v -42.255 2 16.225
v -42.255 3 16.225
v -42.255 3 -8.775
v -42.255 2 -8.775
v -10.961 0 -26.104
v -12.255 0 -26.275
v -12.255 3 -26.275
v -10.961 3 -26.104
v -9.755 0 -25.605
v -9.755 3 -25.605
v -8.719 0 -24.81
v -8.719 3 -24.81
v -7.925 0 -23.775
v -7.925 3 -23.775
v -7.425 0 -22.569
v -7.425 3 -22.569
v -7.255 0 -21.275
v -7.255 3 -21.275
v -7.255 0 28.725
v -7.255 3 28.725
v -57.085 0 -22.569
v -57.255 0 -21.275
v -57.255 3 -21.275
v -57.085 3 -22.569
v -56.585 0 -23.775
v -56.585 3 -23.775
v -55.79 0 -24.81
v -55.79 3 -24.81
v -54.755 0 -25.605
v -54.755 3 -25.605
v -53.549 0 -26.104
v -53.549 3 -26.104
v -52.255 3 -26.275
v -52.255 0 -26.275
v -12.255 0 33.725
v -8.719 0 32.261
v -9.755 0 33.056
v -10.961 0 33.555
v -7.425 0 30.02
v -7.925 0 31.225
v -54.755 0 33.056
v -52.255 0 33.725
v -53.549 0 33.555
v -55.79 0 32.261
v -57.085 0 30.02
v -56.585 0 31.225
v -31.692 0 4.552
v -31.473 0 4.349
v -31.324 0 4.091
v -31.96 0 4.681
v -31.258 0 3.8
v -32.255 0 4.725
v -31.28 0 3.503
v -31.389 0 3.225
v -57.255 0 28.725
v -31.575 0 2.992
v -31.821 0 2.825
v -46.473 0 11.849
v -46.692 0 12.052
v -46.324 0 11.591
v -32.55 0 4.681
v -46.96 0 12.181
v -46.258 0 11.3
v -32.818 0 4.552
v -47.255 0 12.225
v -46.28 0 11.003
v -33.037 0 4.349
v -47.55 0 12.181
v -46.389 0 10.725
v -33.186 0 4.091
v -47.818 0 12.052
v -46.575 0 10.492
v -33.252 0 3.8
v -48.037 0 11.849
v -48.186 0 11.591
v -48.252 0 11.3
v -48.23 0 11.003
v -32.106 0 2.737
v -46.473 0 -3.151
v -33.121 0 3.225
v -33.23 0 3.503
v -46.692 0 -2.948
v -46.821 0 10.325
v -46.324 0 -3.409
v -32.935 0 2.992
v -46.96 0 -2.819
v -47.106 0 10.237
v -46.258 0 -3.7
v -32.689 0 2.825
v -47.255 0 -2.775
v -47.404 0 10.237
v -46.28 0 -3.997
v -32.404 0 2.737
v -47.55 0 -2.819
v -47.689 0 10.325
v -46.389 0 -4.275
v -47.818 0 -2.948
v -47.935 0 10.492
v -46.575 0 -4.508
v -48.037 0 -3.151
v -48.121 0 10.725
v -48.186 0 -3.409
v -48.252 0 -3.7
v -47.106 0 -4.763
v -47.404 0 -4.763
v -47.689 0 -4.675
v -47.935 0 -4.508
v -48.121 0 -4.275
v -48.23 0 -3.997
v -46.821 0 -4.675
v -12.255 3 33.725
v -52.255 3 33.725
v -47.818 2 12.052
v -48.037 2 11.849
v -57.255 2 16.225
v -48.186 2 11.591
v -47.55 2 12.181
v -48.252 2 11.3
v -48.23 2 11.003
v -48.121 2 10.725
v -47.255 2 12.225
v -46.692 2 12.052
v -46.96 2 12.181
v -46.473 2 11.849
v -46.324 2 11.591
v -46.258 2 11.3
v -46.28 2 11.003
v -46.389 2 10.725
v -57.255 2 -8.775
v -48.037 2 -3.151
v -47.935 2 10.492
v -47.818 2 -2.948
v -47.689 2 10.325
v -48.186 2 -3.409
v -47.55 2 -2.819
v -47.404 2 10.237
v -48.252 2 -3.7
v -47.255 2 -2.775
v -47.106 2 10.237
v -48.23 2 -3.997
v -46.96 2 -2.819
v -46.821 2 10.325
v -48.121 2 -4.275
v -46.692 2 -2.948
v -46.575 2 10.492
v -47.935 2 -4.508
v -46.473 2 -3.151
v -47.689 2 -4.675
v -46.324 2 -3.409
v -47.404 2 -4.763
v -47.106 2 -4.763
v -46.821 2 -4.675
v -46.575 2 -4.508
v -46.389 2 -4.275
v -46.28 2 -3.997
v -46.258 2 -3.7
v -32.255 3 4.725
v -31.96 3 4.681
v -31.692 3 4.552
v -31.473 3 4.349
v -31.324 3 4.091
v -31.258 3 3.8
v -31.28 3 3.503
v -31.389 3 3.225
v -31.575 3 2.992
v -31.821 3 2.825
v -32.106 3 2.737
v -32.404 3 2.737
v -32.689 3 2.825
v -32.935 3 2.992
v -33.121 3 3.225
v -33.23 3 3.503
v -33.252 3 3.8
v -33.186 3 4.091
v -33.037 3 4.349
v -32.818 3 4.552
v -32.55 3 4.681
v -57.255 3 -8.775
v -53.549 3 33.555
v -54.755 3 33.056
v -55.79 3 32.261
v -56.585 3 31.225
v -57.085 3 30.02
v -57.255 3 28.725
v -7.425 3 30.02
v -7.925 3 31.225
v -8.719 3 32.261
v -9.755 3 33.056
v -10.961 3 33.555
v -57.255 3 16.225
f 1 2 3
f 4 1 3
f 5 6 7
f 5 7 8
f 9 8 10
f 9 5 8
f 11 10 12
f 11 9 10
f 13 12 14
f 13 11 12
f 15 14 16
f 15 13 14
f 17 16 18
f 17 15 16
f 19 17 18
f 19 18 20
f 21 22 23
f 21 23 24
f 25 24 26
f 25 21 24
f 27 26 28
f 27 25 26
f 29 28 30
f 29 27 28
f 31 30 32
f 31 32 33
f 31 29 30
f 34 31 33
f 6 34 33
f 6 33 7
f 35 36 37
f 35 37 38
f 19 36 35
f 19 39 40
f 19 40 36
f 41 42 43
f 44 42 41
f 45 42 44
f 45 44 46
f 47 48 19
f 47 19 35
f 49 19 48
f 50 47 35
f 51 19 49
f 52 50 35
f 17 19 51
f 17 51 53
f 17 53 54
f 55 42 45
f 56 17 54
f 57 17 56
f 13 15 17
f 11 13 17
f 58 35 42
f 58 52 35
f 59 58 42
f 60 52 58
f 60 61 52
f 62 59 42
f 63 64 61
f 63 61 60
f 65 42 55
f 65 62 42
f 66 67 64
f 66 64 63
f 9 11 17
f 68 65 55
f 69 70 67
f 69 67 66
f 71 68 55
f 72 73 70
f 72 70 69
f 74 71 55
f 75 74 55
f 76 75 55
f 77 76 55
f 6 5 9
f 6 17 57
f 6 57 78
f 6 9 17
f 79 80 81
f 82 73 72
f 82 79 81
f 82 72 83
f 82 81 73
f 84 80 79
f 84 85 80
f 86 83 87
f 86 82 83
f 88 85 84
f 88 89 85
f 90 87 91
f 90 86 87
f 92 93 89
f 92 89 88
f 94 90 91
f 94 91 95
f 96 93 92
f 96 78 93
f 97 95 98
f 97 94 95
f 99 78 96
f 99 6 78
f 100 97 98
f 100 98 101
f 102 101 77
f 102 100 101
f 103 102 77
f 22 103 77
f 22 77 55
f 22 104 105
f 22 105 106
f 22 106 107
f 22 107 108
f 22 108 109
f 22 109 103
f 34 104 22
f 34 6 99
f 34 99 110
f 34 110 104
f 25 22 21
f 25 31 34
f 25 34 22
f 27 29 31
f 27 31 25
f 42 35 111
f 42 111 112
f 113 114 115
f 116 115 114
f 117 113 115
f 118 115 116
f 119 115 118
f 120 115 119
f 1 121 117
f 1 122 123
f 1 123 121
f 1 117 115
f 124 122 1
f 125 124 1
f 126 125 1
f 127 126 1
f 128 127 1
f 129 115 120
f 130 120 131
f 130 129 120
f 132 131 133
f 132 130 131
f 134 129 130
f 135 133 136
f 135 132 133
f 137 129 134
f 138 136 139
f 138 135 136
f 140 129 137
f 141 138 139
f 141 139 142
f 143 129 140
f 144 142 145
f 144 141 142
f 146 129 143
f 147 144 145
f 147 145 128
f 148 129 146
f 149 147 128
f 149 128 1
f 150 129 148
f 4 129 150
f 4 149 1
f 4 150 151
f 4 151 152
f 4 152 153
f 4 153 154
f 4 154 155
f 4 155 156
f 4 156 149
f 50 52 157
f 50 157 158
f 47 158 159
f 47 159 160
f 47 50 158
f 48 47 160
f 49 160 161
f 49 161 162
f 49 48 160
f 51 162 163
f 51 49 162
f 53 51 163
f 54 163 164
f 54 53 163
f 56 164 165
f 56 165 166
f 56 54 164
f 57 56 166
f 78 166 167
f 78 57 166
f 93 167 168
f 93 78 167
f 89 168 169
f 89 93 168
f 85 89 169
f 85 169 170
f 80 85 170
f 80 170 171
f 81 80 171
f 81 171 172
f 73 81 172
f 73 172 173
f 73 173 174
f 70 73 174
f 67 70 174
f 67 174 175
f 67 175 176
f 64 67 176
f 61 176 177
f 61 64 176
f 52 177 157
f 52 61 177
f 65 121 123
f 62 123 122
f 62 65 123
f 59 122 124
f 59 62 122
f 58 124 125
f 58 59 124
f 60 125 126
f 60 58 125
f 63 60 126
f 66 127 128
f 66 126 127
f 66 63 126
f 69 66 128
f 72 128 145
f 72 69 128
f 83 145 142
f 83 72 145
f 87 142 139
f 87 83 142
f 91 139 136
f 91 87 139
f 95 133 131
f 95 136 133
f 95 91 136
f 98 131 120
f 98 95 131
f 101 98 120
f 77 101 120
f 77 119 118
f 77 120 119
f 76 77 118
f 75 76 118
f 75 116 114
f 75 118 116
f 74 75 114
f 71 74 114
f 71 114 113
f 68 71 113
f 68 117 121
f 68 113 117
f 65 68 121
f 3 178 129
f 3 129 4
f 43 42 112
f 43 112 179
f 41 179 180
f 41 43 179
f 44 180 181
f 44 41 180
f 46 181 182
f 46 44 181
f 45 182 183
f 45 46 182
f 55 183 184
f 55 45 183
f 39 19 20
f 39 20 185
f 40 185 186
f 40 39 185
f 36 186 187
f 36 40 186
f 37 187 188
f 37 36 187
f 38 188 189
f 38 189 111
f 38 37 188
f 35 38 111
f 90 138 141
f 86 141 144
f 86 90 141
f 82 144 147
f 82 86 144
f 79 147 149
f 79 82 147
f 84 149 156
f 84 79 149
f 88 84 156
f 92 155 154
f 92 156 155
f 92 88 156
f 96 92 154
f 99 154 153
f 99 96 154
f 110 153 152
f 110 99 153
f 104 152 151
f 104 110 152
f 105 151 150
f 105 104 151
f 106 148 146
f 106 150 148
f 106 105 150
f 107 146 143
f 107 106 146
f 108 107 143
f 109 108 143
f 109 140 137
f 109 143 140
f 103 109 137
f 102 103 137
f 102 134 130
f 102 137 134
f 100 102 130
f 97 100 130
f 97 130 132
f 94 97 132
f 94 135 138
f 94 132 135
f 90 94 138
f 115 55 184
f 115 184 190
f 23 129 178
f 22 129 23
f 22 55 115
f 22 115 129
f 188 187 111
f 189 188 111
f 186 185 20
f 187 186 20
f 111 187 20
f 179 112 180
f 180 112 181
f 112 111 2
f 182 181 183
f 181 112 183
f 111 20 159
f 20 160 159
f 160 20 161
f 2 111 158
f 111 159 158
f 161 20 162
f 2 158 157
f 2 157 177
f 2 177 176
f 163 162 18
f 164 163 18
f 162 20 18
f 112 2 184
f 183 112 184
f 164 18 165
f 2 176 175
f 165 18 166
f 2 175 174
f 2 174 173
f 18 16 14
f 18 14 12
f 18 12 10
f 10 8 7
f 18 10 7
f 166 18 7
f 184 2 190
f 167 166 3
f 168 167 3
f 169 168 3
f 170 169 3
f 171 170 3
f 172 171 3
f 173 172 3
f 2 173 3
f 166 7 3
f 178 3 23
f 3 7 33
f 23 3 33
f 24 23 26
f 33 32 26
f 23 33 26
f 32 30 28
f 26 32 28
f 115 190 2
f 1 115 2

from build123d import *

# Parameters (mm, degrees)
SKETCH1_R           = 1
BOSS_EXTRUDE1_DEPTH = 3
SKETCH2_W           = 15
SKETCH2_H           = 25
CUT_EXTRUDE1_DEPTH  = 1


with BuildPart() as part:
    # Sketch1 → Boss-Extrude1 (new body)
    with BuildSketch(Plane(origin=(0, 0, 0), x_dir=(1, 0, 0), z_dir=(0, 1, 0))):
        with BuildLine():
            Line((-52.254901961, 26.274509804), (-12.254901961, 26.274509804))
            ThreePointArc((-12.254901961, 26.274509804), (-8.719368055, 24.81004371), (-7.254901961, 21.274509804))
            Line((-7.254901961, 21.274509804), (-7.254901961, -28.725490196))
            ThreePointArc((-7.254901961, -28.725490196), (-8.719368055, -32.261024102), (-12.254901961, -33.725490196))
            Line((-12.254901961, -33.725490196), (-52.254901961, -33.725490196))
            ThreePointArc((-52.254901961, -33.725490196), (-55.790435867, -32.261024102), (-57.254901961, -28.725490196))
            Line((-57.254901961, -28.725490196), (-57.254901961, 21.274509804))
            ThreePointArc((-57.254901961, 21.274509804), (-55.790435867, 24.81004371), (-52.254901961, 26.274509804))
        make_face()
        with Locations(Location((-32.254901961, -3.725490196, 0), (0, 0, 270))):
            Circle(SKETCH1_R, mode=Mode.SUBTRACT)
        with Locations(Location((-47.254901961, 3.774509804, 0), (0, 0, 270))):
            Circle(SKETCH1_R, mode=Mode.SUBTRACT)
        with Locations(Location((-47.254901961, -11.225490196, 0), (0, 0, 270))):
            Circle(SKETCH1_R, mode=Mode.SUBTRACT)
    extrude(amount=BOSS_EXTRUDE1_DEPTH)

    # Sketch2 → Cut-Extrude1 (cut)
    with BuildSketch(Plane(origin=(0, 3, 0), x_dir=(1, 0, 0), z_dir=(0, 1, 0))):
        with Locations((-49.754901961, -3.725490196)):
            Rectangle(SKETCH2_W, SKETCH2_H)
    extrude(amount=-CUT_EXTRUDE1_DEPTH, mode=Mode.SUBTRACT)


solid = part.part
